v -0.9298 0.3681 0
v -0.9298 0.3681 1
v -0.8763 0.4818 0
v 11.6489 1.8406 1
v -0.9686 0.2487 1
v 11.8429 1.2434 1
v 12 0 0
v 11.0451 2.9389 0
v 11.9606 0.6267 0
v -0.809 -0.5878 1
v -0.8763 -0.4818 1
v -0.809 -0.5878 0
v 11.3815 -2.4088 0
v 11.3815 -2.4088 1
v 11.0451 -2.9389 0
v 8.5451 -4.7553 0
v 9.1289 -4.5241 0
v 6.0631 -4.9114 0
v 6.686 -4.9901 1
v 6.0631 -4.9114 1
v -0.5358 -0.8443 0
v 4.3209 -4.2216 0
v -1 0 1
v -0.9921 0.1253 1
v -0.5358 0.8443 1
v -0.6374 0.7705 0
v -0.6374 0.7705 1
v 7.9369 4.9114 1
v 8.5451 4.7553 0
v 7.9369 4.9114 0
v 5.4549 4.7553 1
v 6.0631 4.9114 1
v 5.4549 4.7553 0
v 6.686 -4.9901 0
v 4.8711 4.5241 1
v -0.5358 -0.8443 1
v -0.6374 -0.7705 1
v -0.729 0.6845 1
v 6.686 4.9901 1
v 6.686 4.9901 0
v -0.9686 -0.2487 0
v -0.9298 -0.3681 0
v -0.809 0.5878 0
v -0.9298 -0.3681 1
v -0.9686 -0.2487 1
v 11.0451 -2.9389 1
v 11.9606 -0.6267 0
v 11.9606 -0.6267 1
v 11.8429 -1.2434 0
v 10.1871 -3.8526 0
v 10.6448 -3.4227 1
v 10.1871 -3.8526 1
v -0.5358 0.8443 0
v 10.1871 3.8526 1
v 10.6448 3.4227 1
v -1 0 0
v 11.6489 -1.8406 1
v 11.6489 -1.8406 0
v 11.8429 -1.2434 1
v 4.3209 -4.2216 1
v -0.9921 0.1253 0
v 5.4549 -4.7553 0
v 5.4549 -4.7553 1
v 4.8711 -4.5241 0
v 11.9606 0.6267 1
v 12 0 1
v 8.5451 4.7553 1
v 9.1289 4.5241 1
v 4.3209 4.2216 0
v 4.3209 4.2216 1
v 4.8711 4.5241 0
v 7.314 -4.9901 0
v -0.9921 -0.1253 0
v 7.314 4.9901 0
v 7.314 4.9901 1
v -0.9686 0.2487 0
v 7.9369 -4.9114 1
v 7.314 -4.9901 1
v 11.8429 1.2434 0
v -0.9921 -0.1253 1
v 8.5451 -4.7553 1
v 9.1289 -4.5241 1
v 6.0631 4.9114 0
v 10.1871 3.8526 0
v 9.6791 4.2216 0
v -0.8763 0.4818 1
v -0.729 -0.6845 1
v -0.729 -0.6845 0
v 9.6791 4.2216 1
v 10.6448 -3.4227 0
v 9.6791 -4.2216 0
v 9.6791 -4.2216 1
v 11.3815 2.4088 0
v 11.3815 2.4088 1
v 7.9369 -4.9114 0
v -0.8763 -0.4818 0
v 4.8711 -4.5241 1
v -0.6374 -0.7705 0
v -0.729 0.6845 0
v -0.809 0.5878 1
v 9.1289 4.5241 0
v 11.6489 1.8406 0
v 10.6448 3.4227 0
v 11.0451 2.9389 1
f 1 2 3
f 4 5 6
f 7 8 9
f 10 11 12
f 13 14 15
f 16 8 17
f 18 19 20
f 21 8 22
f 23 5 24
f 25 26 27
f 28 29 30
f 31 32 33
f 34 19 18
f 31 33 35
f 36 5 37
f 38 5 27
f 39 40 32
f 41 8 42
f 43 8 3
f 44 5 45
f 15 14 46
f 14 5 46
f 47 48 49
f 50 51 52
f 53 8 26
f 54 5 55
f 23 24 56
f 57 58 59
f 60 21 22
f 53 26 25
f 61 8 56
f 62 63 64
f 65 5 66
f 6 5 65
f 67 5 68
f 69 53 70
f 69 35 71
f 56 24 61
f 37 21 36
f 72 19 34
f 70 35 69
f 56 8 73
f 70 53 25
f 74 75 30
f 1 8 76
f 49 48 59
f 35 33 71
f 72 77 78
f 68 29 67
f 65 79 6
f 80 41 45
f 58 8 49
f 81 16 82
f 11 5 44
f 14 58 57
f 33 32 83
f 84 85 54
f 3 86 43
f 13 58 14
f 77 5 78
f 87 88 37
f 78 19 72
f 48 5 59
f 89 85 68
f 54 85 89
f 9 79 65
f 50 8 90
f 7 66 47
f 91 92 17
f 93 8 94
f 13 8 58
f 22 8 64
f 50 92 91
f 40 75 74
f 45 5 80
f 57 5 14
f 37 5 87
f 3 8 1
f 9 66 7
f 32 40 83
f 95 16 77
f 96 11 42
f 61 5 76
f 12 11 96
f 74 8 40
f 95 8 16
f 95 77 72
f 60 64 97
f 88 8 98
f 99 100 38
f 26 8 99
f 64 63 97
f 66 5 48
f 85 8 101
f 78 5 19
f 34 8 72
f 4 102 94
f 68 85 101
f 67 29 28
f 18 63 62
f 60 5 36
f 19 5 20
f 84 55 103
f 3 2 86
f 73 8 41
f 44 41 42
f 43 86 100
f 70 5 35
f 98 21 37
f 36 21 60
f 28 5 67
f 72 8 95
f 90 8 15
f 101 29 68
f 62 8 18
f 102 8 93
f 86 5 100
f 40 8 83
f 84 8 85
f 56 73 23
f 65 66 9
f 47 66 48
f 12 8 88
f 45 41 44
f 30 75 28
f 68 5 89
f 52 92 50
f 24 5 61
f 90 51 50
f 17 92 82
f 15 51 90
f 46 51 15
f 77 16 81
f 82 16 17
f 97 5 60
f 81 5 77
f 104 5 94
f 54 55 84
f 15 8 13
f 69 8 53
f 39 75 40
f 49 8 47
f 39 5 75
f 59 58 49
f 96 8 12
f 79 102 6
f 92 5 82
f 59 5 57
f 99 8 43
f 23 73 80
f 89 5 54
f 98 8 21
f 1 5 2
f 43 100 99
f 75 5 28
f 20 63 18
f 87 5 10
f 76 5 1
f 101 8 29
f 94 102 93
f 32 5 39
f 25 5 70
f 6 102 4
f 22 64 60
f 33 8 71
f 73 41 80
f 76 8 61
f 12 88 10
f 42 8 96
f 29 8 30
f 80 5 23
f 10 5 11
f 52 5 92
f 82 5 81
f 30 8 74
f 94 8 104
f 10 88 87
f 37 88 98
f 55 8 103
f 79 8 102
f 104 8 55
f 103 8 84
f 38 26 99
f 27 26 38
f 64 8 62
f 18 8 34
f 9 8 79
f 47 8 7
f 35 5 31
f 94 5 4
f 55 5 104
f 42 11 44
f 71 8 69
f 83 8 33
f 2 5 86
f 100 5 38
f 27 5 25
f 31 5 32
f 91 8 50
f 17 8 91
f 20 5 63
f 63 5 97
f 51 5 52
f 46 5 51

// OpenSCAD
// Transforming Shapes - Design Time: Guitar Pick

$fn = 50;

hull() {
    cylinder(h=1, r=1);
    translate([7, 0, 0]) cylinder(h=1, r=5);
}
